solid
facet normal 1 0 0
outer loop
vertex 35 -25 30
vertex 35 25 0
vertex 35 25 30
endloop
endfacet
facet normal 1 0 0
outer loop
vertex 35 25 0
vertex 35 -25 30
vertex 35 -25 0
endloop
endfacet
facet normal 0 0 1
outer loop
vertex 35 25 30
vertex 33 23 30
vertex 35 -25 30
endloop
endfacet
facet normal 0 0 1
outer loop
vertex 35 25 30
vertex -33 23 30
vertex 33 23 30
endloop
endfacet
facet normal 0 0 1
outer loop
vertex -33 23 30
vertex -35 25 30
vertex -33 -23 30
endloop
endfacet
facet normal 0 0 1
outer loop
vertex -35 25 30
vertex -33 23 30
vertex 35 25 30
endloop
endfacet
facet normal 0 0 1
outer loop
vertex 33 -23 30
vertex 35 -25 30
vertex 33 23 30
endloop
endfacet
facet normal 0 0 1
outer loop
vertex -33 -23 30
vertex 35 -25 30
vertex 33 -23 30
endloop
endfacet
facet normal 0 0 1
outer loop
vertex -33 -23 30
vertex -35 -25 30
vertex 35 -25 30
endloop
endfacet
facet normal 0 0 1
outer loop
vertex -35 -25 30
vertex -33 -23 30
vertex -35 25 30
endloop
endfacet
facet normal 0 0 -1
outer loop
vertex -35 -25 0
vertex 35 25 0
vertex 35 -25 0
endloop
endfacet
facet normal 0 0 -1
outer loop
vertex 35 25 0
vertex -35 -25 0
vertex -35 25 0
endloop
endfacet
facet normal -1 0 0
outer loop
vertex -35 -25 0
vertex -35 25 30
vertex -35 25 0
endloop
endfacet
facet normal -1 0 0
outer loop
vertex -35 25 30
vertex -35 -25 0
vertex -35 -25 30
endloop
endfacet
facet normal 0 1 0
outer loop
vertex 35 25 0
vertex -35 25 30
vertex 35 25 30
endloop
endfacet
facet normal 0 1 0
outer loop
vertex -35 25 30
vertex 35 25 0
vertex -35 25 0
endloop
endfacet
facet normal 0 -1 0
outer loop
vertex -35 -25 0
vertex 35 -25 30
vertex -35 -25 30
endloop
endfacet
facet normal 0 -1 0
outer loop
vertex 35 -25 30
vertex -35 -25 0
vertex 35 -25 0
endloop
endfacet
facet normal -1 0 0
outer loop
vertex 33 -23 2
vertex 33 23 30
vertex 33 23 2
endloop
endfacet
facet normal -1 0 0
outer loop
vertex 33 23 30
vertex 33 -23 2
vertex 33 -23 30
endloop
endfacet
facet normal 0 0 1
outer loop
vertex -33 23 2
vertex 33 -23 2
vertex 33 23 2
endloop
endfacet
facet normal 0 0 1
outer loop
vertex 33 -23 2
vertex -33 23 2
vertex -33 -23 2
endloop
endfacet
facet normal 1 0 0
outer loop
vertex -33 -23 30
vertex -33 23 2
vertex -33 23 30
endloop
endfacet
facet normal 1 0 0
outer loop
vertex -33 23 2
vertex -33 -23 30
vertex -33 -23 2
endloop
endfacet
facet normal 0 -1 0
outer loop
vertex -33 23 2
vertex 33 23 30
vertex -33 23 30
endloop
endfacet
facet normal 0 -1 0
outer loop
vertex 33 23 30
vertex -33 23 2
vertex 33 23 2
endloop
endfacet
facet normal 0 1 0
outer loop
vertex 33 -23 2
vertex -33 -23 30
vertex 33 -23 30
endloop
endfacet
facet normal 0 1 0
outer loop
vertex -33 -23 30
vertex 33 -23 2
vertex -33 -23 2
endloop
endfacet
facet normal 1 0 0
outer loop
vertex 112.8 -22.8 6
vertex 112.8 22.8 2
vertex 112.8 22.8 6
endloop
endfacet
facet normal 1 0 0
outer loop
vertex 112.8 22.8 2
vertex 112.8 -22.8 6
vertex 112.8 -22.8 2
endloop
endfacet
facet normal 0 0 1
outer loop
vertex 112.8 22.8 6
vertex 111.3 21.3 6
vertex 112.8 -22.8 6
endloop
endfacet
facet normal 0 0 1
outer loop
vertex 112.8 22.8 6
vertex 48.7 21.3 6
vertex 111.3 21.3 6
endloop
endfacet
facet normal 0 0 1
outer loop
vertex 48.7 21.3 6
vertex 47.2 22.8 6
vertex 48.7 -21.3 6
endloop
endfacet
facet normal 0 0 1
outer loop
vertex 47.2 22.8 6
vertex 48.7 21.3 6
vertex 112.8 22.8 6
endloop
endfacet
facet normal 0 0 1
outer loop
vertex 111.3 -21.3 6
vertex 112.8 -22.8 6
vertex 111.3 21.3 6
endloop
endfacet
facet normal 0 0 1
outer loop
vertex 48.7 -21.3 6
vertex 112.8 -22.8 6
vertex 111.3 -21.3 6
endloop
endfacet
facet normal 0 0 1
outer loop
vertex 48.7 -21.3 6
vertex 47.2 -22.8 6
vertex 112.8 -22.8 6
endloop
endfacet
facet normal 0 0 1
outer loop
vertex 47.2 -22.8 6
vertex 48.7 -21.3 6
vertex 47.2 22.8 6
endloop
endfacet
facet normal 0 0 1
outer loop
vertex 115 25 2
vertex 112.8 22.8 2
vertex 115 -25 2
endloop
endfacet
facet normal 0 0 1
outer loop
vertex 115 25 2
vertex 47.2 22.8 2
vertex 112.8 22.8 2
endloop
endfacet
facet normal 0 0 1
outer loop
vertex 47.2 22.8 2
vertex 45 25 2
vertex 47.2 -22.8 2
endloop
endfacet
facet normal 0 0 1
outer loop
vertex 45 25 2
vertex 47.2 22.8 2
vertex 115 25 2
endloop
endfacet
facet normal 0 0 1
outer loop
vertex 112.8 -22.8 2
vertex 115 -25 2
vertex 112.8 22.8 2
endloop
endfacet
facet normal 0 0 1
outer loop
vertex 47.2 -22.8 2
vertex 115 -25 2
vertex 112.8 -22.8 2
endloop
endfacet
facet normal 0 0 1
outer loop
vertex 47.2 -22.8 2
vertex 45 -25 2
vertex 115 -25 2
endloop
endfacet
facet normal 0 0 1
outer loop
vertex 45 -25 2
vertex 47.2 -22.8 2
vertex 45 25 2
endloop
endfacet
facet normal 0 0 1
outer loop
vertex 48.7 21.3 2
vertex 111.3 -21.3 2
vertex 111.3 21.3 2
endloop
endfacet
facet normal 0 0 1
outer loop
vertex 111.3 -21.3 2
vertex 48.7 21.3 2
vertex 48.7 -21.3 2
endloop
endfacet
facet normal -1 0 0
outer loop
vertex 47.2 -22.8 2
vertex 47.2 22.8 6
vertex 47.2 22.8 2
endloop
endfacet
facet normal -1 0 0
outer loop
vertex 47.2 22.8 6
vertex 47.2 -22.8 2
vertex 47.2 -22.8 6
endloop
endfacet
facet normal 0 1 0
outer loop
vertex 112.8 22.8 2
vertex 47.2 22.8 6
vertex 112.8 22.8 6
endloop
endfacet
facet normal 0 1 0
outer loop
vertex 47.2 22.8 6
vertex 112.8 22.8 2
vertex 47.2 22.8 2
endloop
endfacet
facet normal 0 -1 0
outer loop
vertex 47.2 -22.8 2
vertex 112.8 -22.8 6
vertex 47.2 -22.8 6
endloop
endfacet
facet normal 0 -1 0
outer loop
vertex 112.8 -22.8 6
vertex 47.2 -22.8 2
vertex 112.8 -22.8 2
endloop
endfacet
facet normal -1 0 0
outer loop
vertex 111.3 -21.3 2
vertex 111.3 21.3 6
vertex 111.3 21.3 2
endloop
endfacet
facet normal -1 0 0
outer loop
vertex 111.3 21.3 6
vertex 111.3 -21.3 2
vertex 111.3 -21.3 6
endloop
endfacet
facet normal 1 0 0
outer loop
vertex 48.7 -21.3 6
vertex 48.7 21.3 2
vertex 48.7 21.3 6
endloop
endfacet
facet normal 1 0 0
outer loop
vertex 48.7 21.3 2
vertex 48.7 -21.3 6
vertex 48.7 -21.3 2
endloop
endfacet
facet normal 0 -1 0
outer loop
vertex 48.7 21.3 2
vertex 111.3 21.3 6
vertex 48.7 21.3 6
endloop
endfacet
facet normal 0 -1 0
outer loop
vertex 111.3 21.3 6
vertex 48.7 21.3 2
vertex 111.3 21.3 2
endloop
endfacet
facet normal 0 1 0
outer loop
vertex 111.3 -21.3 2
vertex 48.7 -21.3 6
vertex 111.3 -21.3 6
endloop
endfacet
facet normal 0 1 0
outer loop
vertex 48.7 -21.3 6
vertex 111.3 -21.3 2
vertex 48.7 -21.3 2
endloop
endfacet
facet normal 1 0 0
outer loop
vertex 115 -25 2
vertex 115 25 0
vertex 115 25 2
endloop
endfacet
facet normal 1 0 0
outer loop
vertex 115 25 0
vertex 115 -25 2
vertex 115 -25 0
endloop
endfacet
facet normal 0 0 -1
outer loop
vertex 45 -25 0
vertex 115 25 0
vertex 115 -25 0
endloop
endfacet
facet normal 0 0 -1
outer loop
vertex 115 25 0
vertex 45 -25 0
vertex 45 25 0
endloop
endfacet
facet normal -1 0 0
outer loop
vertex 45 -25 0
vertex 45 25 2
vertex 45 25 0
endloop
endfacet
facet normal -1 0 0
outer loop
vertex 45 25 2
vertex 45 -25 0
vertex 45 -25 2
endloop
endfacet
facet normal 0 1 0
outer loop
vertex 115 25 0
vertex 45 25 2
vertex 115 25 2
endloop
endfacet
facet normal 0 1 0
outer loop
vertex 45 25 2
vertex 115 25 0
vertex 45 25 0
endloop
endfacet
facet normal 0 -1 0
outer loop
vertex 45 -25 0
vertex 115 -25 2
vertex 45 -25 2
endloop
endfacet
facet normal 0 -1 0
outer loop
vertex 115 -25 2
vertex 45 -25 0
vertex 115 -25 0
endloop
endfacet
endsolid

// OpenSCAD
// Two-part enclosure for a small electronics board (Arduino temperature logger)
// Part 1: Box (bottom) - 70 x 50 x 30 mm, 2 mm walls, 2 mm floor, open top
// Part 2: Lid - 70 x 50 x 2 mm plate with 1.5 mm thick, 4 mm tall lip (65.6 x 45.6 mm outer)
// Both parts printed side by side with 10 mm gap, lid on +X side of box

// ==================== DIMENSIONS ====================

// Box dimensions
box_outer_x = 70;    // Box outer width (X)
box_outer_y = 50;    // Box outer depth (Y)
box_outer_z = 30;    // Box outer height (Z)
box_wall = 2;        // Box wall thickness
box_floor = 2;       // Box floor thickness

// Lid dimensions
lid_plate_x = 70;    // Lid plate width (X)
lid_plate_y = 50;    // Lid plate depth (Y)
lid_plate_z = 2;     // Lid plate thickness (Z)
lip_wall = 1.5;      // Lip wall thickness
lip_height = 4;      // Lip height
lip_outer_x = 65.6;  // Lip outer width (X) - 0.2 mm clearance each side vs box inner (66 mm)
lip_outer_y = 45.6;  // Lip outer depth (Y) - 0.2 mm clearance each side vs box inner (46 mm)

// Layout
gap = 10;            // Gap between box and lid

// ==================== BOX (Part 1) ====================
// Centered on origin in X and Y, rests on z=0

module box() {
    // Outer box
    difference() {
        // Outer solid
        translate([-box_outer_x/2, -box_outer_y/2, 0])
            cube([box_outer_x, box_outer_y, box_outer_z], center=false);
        
        // Inner cavity (open top)
        // Inner dimensions: outer - 2*wall for X and Y, floor for Z
        inner_x = box_outer_x - 2 * box_wall;
        inner_y = box_outer_y - 2 * box_wall;
        inner_z = box_outer_z - box_floor;
        
        // Cut from top, so extend 1 mm above to ensure clean cut
        translate([-inner_x/2, -inner_y/2, box_floor])
            cube([inner_x, inner_y, inner_z + 1], center=false);
    }
}

// ==================== LID (Part 2) ====================
// Printed upside down: plate on bed, lip on top
// Centered on origin in X and Y, rests on z=0

module lid() {
    union() {
        // Plate (base)
        translate([-lid_plate_x/2, -lid_plate_y/2, 0])
            cube([lid_plate_x, lid_plate_y, lid_plate_z], center=false);
        
        // Lip (rectangular wall on top of plate)
        // Lip outer: lip_outer_x x lip_outer_y, height lip_height
        // Lip inner: lip_outer_x - 2*lip_wall x lip_outer_y - 2*lip_wall
        // The lip is a hollow rectangular frame
        difference() {
            // Outer lip solid
            translate([-lip_outer_x/2, -lip_outer_y/2, lid_plate_z])
                cube([lip_outer_x, lip_outer_y, lip_height], center=false);
            
            // Inner lip cavity (hollow center)
            lip_inner_x = lip_outer_x - 2 * lip_wall;
            lip_inner_y = lip_outer_y - 2 * lip_wall;
            
            // Cut through the lip, extend 1 mm above to ensure clean cut
            translate([-lip_inner_x/2, -lip_inner_y/2, lid_plate_z])
                cube([lip_inner_x, lip_inner_y, lip_height + 1], center=false);
        }
    }
}

// ==================== LAYOUT ====================
// Box centered at origin
// Lid on +X side with 10 mm gap
// Box right edge at x = box_outer_x/2 = 35
// Lid left edge at x = 35 + gap = 45
// Lid center at x = 45 + lid_plate_x/2 = 45 + 35 = 80

$fn = 64;

// Part 1: Box at origin
box();

// Part 2: Lid on +X side
translate([box_outer_x/2 + gap + lid_plate_x/2, 0, 0])
    lid();
